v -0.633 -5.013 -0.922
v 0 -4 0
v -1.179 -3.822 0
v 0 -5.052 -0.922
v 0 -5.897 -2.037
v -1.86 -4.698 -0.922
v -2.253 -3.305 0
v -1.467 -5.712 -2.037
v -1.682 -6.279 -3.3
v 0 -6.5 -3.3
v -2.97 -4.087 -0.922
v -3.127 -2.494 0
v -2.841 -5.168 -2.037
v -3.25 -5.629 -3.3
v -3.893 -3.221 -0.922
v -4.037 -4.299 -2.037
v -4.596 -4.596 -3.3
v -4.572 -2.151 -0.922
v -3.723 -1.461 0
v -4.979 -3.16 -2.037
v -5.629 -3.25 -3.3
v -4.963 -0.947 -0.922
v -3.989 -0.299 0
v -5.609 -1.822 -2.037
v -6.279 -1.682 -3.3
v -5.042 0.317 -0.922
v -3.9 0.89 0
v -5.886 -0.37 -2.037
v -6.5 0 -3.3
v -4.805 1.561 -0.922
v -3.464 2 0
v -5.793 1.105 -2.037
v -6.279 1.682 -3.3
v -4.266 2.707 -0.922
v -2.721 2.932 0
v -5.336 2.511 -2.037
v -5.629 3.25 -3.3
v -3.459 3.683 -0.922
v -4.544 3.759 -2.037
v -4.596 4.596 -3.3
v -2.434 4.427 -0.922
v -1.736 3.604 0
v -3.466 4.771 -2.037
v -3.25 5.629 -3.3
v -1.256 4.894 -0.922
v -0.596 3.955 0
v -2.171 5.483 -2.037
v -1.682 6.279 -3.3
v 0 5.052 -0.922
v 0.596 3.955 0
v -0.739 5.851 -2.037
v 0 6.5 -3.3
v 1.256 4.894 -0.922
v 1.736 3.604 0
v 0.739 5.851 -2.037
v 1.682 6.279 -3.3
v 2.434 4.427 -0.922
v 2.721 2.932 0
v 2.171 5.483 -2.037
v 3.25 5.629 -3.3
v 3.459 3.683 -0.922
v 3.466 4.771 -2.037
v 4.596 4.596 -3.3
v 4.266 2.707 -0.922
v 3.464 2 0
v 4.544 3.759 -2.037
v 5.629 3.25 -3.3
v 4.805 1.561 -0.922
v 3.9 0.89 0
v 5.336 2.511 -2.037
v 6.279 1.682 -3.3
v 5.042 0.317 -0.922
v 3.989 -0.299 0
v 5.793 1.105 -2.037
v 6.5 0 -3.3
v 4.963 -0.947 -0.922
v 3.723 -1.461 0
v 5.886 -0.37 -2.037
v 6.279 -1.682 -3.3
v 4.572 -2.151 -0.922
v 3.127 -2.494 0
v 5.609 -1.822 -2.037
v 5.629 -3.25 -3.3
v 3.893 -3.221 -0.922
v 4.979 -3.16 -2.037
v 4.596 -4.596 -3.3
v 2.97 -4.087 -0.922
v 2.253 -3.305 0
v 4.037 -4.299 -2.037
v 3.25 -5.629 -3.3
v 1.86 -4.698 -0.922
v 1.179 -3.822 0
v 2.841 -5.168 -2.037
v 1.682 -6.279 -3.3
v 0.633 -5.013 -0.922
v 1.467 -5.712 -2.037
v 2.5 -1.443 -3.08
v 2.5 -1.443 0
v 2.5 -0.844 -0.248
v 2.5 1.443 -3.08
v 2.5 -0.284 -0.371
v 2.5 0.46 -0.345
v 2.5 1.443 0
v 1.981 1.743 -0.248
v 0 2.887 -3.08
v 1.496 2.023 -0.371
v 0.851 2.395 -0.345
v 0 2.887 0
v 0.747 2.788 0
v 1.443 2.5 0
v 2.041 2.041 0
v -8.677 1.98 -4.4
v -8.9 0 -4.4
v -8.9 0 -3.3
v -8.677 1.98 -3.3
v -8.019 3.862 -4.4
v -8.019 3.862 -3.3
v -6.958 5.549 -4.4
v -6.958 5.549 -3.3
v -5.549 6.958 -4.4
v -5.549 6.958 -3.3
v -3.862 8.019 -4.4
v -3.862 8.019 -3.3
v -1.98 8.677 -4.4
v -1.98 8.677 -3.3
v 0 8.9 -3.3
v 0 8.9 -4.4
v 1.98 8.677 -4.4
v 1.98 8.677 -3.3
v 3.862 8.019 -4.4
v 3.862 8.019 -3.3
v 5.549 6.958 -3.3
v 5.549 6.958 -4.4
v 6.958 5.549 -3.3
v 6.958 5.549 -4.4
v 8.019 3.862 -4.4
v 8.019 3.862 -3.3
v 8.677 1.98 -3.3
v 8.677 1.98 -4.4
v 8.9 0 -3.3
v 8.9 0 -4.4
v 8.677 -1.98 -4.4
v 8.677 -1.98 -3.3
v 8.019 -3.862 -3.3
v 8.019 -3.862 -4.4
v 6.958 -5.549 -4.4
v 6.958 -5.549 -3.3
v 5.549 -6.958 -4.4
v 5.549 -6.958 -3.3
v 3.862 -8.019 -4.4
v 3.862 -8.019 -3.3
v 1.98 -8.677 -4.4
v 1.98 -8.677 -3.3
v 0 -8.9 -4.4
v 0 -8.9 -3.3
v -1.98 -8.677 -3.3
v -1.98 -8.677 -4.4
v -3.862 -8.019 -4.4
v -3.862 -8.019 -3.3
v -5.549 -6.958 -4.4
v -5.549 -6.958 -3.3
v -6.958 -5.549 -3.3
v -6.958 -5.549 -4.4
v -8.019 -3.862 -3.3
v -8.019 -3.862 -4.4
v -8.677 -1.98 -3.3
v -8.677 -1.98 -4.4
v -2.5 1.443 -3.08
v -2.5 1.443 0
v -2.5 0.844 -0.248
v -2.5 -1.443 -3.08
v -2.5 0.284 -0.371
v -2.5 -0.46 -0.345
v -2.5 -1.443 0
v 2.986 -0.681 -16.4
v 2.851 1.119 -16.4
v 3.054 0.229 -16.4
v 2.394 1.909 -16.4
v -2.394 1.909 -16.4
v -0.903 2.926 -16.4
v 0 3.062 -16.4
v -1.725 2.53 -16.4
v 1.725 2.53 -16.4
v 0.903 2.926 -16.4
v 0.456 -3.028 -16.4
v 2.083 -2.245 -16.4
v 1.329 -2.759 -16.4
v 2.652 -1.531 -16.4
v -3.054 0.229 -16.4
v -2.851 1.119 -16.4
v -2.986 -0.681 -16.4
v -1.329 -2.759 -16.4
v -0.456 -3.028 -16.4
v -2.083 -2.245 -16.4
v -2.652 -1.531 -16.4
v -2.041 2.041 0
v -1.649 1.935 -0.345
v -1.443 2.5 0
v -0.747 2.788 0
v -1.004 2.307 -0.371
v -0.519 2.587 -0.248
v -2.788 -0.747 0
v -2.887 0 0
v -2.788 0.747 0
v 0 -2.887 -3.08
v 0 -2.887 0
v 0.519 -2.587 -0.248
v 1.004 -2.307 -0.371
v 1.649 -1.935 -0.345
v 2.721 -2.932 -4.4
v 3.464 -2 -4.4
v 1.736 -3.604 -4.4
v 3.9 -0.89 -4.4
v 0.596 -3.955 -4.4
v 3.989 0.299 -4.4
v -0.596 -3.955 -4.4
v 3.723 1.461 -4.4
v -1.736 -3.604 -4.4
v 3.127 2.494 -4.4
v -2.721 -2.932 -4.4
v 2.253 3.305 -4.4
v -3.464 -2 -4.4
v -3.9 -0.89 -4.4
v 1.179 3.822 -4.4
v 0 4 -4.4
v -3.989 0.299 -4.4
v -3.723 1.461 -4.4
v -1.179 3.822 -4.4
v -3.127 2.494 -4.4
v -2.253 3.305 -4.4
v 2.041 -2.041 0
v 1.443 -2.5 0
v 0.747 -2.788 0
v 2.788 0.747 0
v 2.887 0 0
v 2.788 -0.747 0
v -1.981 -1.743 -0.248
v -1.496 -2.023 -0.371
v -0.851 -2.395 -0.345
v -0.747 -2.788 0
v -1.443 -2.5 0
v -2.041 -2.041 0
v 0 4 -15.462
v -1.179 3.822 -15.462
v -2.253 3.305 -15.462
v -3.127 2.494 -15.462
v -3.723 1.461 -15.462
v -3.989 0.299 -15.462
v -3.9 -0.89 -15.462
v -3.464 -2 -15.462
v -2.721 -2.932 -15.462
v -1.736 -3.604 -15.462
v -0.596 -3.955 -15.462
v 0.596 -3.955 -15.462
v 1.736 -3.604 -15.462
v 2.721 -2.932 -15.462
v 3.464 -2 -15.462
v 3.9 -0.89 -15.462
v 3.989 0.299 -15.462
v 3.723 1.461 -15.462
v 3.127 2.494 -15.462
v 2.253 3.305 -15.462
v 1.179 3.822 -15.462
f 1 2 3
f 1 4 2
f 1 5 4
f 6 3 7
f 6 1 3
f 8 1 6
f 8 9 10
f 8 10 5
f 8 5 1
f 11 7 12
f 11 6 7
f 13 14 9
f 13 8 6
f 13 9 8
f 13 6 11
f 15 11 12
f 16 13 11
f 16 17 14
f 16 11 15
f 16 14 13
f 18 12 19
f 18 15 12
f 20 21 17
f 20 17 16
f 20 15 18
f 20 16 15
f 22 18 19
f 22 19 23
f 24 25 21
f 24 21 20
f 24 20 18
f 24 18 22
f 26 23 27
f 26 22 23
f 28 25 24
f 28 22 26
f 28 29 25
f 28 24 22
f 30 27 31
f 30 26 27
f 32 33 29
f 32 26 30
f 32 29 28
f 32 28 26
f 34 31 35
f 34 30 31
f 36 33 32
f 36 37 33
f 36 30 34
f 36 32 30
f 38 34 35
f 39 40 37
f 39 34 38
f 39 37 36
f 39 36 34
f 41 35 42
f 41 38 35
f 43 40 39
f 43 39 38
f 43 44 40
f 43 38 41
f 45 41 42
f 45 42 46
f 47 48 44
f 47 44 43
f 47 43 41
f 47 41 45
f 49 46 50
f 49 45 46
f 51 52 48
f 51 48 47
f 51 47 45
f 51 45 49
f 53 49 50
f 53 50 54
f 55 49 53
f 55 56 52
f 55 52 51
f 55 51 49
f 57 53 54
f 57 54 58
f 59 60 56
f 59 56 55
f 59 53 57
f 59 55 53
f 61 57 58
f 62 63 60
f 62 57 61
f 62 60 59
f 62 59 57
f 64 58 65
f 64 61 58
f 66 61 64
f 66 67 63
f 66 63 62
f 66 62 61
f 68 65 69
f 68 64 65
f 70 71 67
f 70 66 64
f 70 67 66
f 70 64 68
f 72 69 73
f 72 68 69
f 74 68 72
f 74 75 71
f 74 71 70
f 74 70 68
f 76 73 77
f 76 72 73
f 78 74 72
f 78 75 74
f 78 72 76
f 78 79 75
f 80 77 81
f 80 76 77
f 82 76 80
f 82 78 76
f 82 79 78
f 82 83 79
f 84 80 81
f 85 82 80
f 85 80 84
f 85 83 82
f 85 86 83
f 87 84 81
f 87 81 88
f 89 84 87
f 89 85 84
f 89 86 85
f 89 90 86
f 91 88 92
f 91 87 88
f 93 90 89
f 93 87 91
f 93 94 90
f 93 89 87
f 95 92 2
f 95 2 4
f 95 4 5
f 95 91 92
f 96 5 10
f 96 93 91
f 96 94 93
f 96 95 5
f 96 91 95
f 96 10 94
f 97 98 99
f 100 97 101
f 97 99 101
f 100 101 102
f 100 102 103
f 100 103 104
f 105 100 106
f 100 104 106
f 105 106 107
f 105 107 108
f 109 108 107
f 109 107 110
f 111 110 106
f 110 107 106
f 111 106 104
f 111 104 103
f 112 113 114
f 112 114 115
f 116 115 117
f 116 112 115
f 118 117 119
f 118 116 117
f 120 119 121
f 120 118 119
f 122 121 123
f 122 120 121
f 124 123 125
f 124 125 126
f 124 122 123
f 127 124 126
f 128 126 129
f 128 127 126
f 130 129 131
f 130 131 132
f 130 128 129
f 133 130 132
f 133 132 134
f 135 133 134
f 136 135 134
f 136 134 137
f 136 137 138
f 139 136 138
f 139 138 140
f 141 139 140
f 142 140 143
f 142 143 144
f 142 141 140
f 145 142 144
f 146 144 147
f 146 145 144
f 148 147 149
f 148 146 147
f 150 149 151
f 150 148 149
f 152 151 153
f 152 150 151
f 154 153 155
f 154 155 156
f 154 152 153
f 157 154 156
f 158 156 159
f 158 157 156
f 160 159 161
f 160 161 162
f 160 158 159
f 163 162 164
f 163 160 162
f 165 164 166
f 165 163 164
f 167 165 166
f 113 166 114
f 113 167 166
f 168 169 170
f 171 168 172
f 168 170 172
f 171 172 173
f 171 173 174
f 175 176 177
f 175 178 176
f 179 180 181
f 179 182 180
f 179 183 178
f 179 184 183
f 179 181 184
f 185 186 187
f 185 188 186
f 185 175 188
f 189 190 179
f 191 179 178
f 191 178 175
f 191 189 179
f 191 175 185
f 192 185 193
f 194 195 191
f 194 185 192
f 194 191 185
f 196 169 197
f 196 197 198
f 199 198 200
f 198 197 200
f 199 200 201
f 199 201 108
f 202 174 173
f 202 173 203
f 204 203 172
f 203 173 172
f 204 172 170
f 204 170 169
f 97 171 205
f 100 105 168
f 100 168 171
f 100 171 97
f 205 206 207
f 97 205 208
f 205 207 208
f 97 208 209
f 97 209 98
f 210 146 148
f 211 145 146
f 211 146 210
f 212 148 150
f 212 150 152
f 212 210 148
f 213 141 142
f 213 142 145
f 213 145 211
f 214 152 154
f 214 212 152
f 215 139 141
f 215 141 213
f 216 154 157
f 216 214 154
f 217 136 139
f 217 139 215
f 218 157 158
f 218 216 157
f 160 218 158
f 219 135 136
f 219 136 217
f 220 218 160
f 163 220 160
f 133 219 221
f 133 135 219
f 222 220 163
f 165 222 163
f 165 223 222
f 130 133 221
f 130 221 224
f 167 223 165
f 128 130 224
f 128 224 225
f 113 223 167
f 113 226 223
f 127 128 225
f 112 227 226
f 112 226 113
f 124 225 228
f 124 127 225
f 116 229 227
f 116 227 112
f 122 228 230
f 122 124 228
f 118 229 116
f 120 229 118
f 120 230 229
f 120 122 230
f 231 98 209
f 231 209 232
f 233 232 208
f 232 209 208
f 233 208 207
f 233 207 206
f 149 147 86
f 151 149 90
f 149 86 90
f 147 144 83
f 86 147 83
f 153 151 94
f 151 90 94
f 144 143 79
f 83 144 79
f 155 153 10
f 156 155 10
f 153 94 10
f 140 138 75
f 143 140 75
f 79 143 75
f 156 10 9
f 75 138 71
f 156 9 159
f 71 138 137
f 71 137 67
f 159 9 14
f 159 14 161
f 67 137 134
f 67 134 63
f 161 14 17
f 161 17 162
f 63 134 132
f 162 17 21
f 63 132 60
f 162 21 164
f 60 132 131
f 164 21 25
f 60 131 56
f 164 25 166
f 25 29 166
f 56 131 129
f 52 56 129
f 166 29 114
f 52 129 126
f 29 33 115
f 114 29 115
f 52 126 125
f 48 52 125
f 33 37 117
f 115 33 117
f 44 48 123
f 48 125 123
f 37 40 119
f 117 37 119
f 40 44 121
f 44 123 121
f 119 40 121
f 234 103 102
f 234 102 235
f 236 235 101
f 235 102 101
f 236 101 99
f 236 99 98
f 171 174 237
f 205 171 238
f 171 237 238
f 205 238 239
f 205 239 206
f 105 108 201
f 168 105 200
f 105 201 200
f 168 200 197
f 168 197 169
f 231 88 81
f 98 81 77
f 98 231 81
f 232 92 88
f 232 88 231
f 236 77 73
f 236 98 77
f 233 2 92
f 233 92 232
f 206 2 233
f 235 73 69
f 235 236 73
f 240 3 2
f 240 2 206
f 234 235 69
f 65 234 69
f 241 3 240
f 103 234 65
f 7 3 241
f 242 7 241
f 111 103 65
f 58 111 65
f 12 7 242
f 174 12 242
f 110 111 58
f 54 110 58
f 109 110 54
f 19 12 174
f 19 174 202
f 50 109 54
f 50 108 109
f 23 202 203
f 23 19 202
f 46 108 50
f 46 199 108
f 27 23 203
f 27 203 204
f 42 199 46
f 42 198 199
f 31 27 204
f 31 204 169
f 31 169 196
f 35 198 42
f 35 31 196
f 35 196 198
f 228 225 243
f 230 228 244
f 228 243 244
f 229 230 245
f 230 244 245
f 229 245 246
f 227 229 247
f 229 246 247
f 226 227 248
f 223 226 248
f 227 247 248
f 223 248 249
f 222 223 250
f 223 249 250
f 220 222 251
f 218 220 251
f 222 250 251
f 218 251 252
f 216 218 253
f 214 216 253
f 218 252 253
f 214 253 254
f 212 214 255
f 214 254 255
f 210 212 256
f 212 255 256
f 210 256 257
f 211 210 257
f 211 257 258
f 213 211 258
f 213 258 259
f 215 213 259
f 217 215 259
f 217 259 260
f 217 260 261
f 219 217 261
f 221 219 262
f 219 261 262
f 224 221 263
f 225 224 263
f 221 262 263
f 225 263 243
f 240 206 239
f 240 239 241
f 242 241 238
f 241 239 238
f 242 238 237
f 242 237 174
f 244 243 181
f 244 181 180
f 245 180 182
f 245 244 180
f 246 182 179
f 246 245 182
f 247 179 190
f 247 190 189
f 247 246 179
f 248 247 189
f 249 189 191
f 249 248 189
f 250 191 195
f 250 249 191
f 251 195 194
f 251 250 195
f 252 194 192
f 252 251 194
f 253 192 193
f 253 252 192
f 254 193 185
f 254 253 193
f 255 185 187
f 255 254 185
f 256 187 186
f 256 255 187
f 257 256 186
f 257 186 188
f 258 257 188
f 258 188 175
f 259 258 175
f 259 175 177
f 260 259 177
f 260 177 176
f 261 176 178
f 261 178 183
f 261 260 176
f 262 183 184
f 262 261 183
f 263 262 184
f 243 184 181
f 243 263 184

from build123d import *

# Parameters (mm, degrees)
SKETCH1_W           = 12
SKETCH1_H           = 4
CHAMFER1_SIZE       = 0.9375
SKETCH11_R          = 8.9
BOSS_EXTRUDE3_DEPTH = 1.1
CUT_EXTRUDE2_DEPTH  = 3.08


with BuildPart() as part:
    # Sketch1 → Revolve1 (revolve)
    with BuildSketch(Plane(origin=(0, 0, 0), x_dir=(0, 0, -1), z_dir=(1, 0, 0))):
        with Locations((10.4, 2)):
            Rectangle(SKETCH1_W, SKETCH1_H)
    revolve(axis=Axis((0, 0, -16.4), (0, 0, 1)))

    # Chamfer1
    chamfer1_edges = [part.edges().sort_by_distance(p)[0] for p in [
        (0, -4, -16.4),
    ]]
    chamfer(chamfer1_edges, length=CHAMFER1_SIZE)

    # Sketch7 → Revolve2 (revolve)
    with BuildSketch(Plane(origin=(0, 0, 0), x_dir=(0, 0, -1), z_dir=(1, 0, 0)), mode=Mode.PRIVATE) as revolve2_sk:
        with BuildLine():
            Line((3.3, 6.5), (4.4, 6.5))
            Line((4.4, 6.5), (4.4, 0))
            Line((4.4, 0), (0, 0))
            Line((0, 0), (0, 4))
            ThreePointArc((0, 4), (1.458196289, 5.503180898), (3.3, 6.5))
        make_face()
    revolve(revolve2_sk.sketch.rotate(Axis((0, 0, 0), (0, 0, -1)), 180), axis=Axis((0, 0, 0), (0, 0, -1)))

    # Sketch11 → Boss-Extrude3 (add)
    with BuildSketch(Plane(origin=(0, 0, -4.4), x_dir=(-1, 0, 0), z_dir=(0, 0, -1))):
        Circle(SKETCH11_R)
    extrude(amount=-BOSS_EXTRUDE3_DEPTH)

    # Sketch5 → Cut-Extrude2 (cut)
    with BuildSketch(Plane.XY):
        Polygon((2.5, -1.443375673), (2.5, 1.443375673), (0, 2.886751346), (-2.5, 1.443375673), (-2.5, -1.443375673), (0, -2.886751346), align=None)
    extrude(amount=-CUT_EXTRUDE2_DEPTH, mode=Mode.SUBTRACT)

    # Cut-Extrude3 cone 1 section (through the dimple's axis) → Cut-Extrude3 (revolve, cut)
    with BuildSketch(Plane(origin=(0, 0, 0), x_dir=(0, -1, 0), z_dir=(1, 0, 0))):
        Polygon((0, 0), (2.886751346, 0), (0, 2.886751346), align=None)
    revolve(axis=Axis((0, 0, 0), (0, 0, -1)), mode=Mode.SUBTRACT)


solid = part.part
